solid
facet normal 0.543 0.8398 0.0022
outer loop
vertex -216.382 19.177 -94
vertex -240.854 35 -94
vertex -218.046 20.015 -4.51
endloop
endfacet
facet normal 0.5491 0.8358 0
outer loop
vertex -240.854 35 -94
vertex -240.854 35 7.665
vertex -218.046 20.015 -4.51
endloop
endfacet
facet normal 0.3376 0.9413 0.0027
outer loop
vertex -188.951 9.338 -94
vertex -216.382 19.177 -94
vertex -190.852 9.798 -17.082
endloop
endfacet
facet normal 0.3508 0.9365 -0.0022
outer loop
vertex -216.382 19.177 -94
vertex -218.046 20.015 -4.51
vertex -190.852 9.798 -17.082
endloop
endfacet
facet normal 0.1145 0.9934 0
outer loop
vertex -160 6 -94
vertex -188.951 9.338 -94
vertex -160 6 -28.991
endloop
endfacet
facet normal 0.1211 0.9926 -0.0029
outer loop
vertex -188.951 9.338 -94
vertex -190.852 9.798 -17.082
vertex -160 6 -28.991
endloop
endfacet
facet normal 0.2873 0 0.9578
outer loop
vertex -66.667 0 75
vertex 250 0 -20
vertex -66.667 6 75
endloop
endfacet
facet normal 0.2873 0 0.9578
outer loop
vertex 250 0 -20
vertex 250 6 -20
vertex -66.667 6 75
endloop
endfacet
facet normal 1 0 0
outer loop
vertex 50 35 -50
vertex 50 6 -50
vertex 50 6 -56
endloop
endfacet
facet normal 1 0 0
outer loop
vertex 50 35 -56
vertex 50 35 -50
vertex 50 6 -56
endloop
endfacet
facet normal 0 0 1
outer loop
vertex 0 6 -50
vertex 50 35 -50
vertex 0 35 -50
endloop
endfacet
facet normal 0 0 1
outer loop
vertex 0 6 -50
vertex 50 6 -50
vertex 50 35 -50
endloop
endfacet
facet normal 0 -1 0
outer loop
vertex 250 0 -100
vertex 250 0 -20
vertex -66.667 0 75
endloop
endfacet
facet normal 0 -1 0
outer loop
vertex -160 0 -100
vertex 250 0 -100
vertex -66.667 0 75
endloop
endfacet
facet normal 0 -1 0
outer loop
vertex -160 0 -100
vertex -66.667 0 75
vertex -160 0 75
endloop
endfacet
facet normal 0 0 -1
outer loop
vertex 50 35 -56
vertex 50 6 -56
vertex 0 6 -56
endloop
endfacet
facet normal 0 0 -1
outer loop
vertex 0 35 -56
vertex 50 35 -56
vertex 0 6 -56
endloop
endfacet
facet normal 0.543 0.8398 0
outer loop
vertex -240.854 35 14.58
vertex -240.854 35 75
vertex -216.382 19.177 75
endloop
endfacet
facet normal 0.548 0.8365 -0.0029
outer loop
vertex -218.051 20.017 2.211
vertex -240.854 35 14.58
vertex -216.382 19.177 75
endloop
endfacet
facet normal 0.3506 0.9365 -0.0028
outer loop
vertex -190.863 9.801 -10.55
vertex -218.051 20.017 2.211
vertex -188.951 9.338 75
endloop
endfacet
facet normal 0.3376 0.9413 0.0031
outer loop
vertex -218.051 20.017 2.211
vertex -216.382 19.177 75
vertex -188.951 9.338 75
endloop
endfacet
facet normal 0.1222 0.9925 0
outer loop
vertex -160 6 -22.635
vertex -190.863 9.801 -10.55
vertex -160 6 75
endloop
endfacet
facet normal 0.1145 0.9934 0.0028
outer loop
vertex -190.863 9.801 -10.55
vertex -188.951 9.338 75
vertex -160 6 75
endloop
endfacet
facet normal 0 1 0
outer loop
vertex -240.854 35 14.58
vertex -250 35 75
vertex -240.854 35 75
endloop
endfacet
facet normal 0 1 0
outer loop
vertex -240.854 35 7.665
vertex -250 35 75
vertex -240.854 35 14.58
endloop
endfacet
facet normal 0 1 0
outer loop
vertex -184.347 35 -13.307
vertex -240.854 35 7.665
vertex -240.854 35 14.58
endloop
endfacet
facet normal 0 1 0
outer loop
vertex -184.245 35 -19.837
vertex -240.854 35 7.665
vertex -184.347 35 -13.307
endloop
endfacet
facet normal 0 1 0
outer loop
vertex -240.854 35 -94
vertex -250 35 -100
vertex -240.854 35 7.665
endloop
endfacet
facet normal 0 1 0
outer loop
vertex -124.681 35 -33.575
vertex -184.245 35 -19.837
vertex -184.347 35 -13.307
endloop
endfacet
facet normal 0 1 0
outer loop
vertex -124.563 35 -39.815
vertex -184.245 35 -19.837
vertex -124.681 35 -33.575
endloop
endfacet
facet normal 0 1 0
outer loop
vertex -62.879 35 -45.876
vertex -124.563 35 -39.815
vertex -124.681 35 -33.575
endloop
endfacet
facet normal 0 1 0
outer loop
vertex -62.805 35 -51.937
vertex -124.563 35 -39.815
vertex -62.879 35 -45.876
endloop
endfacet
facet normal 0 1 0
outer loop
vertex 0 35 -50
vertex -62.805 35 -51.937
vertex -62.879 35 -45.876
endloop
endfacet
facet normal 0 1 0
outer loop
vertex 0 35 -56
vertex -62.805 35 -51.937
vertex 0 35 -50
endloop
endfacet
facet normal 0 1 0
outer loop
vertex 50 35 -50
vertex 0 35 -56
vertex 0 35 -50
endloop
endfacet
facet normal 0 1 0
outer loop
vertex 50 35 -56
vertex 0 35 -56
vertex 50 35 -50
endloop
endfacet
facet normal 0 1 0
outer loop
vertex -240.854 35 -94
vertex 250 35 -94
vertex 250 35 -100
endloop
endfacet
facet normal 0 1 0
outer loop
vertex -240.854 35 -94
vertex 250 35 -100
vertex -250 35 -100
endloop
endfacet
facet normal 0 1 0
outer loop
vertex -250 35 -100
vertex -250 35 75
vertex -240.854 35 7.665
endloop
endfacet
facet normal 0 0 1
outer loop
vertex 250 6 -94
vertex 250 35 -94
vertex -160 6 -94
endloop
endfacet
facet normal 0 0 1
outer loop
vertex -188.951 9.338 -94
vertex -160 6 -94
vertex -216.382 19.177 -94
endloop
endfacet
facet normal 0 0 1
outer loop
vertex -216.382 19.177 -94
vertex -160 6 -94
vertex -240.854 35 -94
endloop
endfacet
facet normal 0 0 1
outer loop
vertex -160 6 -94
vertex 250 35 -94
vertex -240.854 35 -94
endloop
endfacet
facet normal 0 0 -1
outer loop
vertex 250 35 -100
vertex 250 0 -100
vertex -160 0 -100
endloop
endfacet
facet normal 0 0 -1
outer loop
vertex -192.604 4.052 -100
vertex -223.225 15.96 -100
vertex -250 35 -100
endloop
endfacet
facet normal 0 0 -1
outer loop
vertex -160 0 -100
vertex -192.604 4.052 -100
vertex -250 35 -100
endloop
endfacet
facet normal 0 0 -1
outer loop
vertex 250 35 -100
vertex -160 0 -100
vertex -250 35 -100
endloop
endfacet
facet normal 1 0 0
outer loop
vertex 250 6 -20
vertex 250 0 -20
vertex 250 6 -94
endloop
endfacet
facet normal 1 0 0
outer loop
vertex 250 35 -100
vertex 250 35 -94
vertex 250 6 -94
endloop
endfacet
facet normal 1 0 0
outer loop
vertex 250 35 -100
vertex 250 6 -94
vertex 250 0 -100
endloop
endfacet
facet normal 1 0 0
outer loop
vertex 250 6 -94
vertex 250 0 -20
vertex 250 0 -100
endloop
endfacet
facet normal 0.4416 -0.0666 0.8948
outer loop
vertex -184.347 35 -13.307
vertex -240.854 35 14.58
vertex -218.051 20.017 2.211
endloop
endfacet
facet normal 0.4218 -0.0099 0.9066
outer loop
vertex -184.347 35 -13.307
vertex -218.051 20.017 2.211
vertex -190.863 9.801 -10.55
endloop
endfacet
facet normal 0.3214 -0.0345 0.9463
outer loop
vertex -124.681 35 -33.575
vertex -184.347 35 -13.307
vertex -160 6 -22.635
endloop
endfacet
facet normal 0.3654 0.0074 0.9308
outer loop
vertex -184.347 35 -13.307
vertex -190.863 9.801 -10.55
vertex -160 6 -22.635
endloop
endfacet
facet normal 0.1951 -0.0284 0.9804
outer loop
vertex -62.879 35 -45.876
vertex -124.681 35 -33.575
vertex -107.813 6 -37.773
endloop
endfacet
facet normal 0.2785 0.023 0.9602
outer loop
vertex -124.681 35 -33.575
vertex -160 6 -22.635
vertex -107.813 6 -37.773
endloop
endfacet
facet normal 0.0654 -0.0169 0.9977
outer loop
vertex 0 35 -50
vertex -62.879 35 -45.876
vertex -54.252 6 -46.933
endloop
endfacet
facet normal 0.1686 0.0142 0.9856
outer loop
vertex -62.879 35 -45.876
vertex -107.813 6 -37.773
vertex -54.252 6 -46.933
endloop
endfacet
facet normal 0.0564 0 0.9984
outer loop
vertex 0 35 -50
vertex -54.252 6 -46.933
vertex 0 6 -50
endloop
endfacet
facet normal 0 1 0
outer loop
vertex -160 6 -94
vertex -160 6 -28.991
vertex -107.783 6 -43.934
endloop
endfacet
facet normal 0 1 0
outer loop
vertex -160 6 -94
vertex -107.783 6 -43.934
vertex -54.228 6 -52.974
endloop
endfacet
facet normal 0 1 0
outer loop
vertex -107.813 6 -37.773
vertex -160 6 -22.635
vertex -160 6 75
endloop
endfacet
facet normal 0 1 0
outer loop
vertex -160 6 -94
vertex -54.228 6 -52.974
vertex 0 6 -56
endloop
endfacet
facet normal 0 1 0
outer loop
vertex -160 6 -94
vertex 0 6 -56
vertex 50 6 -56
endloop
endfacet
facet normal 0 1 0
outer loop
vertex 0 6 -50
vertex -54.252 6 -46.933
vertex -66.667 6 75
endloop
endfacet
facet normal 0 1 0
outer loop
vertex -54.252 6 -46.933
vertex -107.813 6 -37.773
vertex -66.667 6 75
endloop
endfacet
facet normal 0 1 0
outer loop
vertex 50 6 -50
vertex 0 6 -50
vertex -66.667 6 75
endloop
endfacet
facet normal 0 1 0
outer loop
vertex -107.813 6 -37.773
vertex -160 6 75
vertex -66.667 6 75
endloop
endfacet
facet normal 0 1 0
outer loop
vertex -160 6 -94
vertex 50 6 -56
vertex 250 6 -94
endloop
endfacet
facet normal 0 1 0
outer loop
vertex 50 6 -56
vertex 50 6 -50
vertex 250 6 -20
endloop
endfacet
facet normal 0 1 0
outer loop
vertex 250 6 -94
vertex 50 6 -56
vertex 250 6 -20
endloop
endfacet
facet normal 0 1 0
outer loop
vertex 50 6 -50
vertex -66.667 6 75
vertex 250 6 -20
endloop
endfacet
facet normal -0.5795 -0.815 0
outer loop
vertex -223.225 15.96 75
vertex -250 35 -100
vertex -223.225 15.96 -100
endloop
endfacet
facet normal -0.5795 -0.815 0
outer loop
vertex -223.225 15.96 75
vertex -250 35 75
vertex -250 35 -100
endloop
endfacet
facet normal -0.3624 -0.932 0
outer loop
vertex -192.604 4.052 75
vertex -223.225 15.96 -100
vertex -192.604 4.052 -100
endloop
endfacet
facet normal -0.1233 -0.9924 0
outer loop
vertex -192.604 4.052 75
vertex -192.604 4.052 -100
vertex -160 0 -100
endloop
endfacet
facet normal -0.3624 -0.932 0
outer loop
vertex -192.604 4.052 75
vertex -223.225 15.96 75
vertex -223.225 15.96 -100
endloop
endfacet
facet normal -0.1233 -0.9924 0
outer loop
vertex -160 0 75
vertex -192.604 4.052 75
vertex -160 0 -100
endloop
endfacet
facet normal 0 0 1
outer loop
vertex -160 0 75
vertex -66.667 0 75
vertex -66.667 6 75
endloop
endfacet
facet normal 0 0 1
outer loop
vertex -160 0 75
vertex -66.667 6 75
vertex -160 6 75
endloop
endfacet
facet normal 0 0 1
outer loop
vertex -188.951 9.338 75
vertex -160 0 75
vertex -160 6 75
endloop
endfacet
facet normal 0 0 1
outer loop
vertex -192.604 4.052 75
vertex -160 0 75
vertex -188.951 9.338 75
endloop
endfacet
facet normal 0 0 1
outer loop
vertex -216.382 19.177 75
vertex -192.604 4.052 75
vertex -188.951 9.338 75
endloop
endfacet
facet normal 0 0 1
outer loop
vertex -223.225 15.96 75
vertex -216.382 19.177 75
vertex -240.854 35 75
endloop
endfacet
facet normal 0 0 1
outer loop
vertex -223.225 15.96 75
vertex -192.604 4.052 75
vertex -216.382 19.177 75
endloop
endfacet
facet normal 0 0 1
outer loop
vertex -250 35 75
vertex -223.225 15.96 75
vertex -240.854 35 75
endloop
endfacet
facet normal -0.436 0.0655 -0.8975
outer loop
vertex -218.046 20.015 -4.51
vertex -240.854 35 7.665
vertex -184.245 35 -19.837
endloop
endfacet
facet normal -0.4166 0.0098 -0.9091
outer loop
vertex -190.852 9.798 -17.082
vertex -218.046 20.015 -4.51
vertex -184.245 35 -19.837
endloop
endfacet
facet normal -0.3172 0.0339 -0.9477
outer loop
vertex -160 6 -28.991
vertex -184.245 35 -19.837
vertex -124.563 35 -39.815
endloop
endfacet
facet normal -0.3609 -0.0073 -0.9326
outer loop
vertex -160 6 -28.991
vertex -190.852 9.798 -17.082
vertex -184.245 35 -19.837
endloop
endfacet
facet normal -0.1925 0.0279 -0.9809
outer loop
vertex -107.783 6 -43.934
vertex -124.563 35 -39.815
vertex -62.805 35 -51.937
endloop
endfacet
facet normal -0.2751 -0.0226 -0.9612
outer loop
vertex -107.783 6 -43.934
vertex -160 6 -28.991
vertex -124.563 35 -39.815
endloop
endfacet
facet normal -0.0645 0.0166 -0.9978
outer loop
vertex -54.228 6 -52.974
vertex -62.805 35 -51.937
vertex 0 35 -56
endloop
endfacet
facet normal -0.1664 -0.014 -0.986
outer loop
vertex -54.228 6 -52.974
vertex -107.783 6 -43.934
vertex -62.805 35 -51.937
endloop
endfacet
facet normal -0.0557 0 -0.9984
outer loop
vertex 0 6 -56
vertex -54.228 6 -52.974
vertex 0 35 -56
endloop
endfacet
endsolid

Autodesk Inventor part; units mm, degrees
ref_plane "YZ Plane" through (0, 0, 0) normal (1, 0, 0) x (0, 1, 0)
ref_plane "XZ Plane" through (0, 0, 0) normal (0, 1, 0) x (-1, 0, 0)
ref_plane "XY Plane" through (0, 0, 0) normal (0, 0, 1) x (1, 0, 0)
sketch "スケッチ1" plane through (0, 0, 0) normal (0, 1, 0) x (-1, 0, 0)
  line L0 (250, 100) -> (-250, 100)
  line L1 (-250, 100) -> (-250, -100)
  line L2 (-250, -100) -> (250, -100)
  line L3 (250, -100) -> (250, 100)
  point P0 (0, 0)
  dimension "d2" = 250
  dimension "d3" = 500
  dimension "d4" = 100
  dimension "d5" = 200
extrude "押し出し1" add sketch "スケッチ1" along normal blind 35
sketch "スケッチ2" plane through (-250, 0, 100) normal (0, 0, 1) x (1, 0, 0)
  line L0 (0, 35) -> (500, 35) projected
  line L1 (0, 0) -> (500, 0) projected
  arc A0 (0, 35) -> (90, 0) centre (90, 133.2143) ccw
  line L2 (0, 0) -> (0, 35) projected
  point P0 (250, 0)
  dimension "d8" = 90
extrude "押し出し2" cut sketch "スケッチ2" against normal through all
sketch "スケッチ5" plane through (-160, 0, 100) normal (0, 0, 1) x (1, 0, 0)
  arc A0 (-90, 35) -> (0, 0) centre (0, 133.2143) ccw projected
  line L0 (0, 0) -> (410, 0) projected
  arc A1 (-80.8544, 35) -> (0, 6) centre (0, 133.2143) ccw
  line L1 (0, 6) -> (54.4195, 6)
  line L2 (54.4195, 6) -> (410, 6)
  line L3 (-90, 35) -> (410, 35) projected
  line L4 (410, 0) -> (410, 35) projected
  point P0 (160, 0)
  point P1 (40, 35)
  dimension "d20" = 6
extrude "押し出し5" cut sketch "スケッチ5" against normal through all contours L3 L4 L2 L1 A1
sketch "スケッチ8" plane through (-160, 6, 100) normal (0, 1, 0) x (1, 0, 0)
  line L0 (210, 150) -> (160, 150)
  line L1 (410, 200) -> (410, 0) projected
  line L2 (0, 200) -> (410, 200) projected
  arc A0 (160, 150) -> (-90, 80) centre (160, -331.4286) ccw
  line L3 (-90, 200) -> (-90, 0) projected
  line L4 (-80.8544, 200) -> (0, 200) projected
  line L5 (-80.8544, 200) -> (-90, 200) projected
  line L6 (210, 156) -> (160, 156)
  arc A1 (160, 156) -> (-90, 87.005) centre (160, -331.4286) ccw
  line L7 (210, 150) -> (210, 156)
  line L8 (410, 0) -> (410, 200) projected
  line L9 (-90, 87.005) -> (-90, 80)
  point P0 (160, 100)
  dimension "d35" = 50
  dimension "d36" = 120
  dimension "d38" = 6
  dimension "d47" = 250
  dimension "d48" = 50
extrude "押し出し7" add sketch "スケッチ8" along normal up to surface (29 mm away)
delete faces "面を削除1" heal yes whole lump no faces at (-246.2129, 22.2141, 17.7225) (-250, 25.3333, 15.33) (-244.511, 6, 14.4766) (-246.2115, 22.2135, 10.7547)
sketch "スケッチ10" plane through (-160, 6, 100) normal (0, 1, 0) x (1, 0, 0)
  line L0 (410, 150) -> (410, 0) projected
  line L1 (410, 0) -> (0, 0) projected
  line L2 (410, 0) -> (410, 200) projected
  line L3 (410, 120) -> (10, 0)
  line L4 (0, 0) -> (410, 0) projected
  point P0 (160, 100)
  point P1 (210, 150)
  dimension "d43" = 400
  dimension "d44" = 120
extrude "押し出し9" cut sketch "スケッチ10" against normal through all
sketch "スケッチ11" plane through (250, 6, -100) normal (0, 0, -1) x (-1, 0, 0)
  line L0 (0, -6) -> (410, -6) projected
  arc A0 (410, -6) -> (500, 29) centre (410, 127.2143) ccw projected
  line L1 (0, -6) -> (0, 29)
  line L2 (0, 29) -> (500, 29)
  point P0 (250, -6)
extrude "押し出し10" add sketch "スケッチ11" against normal blind 6
sketch "スケッチ12" plane through (0, 0, 0) normal (0, 1, 0) x (-1, 0, 0)
  line L0 (250, -100) -> (250, 100) projected
  line L1 (250, 100) -> (0, 100)
  line L2 (0, 100) -> (0, 75)
  line L3 (0, 75) -> (250, 75)
  line L4 (250, 75) -> (250, 100)
  point P0 (0, 0)
  dimension "d51" = 25
extrude "押し出し11" cut sketch "スケッチ12" along normal through all
properties part number "endplate_ver2"
